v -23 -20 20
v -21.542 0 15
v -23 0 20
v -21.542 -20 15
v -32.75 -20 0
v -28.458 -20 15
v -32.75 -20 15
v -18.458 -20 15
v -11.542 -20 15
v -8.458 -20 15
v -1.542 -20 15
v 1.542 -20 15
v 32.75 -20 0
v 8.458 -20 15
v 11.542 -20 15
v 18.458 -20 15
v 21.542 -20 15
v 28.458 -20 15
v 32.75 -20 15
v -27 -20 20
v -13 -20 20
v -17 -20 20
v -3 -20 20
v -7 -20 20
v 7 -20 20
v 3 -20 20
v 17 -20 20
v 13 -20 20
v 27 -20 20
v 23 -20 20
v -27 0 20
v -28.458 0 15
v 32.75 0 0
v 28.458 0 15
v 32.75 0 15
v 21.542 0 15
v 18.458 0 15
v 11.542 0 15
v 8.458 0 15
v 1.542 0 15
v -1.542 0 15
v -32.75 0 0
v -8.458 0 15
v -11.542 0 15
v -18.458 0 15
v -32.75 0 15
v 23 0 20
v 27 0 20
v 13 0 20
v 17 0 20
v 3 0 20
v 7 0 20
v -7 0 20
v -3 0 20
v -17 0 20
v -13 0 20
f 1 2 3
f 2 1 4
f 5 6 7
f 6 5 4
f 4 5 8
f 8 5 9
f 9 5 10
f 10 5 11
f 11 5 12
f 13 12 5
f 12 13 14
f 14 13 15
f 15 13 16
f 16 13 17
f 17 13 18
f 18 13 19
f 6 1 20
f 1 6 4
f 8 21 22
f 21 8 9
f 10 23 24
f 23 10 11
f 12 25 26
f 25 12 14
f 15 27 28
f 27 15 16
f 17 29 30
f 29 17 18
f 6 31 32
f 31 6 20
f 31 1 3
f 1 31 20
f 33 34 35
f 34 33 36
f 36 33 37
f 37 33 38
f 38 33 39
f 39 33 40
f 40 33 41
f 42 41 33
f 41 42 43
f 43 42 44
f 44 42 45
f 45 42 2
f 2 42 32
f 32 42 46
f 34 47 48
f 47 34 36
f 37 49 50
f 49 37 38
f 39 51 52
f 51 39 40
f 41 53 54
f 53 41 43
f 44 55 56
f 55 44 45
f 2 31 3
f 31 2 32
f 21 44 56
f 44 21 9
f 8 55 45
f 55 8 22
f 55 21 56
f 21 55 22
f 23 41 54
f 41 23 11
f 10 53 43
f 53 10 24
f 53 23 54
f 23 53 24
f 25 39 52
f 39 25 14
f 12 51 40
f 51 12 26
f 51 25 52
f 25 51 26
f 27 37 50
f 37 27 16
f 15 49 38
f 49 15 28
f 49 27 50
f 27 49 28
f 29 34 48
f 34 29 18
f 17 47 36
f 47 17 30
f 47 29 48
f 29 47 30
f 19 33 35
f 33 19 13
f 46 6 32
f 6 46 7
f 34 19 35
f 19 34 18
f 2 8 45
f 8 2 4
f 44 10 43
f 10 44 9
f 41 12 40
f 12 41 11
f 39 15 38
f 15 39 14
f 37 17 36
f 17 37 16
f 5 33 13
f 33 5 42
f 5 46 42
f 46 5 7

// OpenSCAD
$fn = 32;

// ----------------------------------------------------------------------
// Toothed rack, 6 teeth
// 10 mm pitch, 5 mm teeth
// ----------------------------------------------------------------------

// --- parameters (mm) ---
bar_w = 20;    // bar width (Y)
bar_h = 15;    // bar height (Z)
teeth = 6;     // number of teeth
pitch = 10;    // tooth pitch
tooth_h = 5;   // tooth height above the bar
root_w = 7.5;  // tooth width at the root
crest_w = 4;   // tooth width at the crest

// --- derived feature positions (mm) ---
span = (teeth - 1) * pitch;  // = 50   distance between the outer teeth
bar_l = span + root_w + 8;   // = 65.5   bar length: teeth plus 4 mm at each end
tooth_x = -span / 2;         // = -25   X of the first tooth
height = bar_h + tooth_h;    // = 20   overall height
feature_centers = [
  [tooth_x + 0 * pitch, -bar_w / 2],
  [tooth_x + 1 * pitch, -bar_w / 2],
  [tooth_x + 2 * pitch, -bar_w / 2],
  [tooth_x + 3 * pitch, -bar_w / 2],
  [tooth_x + 4 * pitch, -bar_w / 2],
  [tooth_x + 5 * pitch, -bar_w / 2]
];   // tooth centre line, drives the tooth loop

// bar with a rack of teeth, one extruded trapezoium per centre
module rack_tooth() {
  linear_extrude(height = bar_w)
    polygon(points = [
      [0, 0],
      [root_w, 0],
      [root_w / 2 + crest_w / 2, tooth_h + 1],
      [root_w / 2 - crest_w / 2, tooth_h + 1]
    ]);
}

union() {
  translate([-bar_l / 2, -bar_w, 0]) cube([bar_l, bar_w, bar_h]);
  for (centre = feature_centers)
    translate([centre[0] - root_w / 2, 0, bar_h - 1]) rotate([90, 0, 0]) rack_tooth();
}
